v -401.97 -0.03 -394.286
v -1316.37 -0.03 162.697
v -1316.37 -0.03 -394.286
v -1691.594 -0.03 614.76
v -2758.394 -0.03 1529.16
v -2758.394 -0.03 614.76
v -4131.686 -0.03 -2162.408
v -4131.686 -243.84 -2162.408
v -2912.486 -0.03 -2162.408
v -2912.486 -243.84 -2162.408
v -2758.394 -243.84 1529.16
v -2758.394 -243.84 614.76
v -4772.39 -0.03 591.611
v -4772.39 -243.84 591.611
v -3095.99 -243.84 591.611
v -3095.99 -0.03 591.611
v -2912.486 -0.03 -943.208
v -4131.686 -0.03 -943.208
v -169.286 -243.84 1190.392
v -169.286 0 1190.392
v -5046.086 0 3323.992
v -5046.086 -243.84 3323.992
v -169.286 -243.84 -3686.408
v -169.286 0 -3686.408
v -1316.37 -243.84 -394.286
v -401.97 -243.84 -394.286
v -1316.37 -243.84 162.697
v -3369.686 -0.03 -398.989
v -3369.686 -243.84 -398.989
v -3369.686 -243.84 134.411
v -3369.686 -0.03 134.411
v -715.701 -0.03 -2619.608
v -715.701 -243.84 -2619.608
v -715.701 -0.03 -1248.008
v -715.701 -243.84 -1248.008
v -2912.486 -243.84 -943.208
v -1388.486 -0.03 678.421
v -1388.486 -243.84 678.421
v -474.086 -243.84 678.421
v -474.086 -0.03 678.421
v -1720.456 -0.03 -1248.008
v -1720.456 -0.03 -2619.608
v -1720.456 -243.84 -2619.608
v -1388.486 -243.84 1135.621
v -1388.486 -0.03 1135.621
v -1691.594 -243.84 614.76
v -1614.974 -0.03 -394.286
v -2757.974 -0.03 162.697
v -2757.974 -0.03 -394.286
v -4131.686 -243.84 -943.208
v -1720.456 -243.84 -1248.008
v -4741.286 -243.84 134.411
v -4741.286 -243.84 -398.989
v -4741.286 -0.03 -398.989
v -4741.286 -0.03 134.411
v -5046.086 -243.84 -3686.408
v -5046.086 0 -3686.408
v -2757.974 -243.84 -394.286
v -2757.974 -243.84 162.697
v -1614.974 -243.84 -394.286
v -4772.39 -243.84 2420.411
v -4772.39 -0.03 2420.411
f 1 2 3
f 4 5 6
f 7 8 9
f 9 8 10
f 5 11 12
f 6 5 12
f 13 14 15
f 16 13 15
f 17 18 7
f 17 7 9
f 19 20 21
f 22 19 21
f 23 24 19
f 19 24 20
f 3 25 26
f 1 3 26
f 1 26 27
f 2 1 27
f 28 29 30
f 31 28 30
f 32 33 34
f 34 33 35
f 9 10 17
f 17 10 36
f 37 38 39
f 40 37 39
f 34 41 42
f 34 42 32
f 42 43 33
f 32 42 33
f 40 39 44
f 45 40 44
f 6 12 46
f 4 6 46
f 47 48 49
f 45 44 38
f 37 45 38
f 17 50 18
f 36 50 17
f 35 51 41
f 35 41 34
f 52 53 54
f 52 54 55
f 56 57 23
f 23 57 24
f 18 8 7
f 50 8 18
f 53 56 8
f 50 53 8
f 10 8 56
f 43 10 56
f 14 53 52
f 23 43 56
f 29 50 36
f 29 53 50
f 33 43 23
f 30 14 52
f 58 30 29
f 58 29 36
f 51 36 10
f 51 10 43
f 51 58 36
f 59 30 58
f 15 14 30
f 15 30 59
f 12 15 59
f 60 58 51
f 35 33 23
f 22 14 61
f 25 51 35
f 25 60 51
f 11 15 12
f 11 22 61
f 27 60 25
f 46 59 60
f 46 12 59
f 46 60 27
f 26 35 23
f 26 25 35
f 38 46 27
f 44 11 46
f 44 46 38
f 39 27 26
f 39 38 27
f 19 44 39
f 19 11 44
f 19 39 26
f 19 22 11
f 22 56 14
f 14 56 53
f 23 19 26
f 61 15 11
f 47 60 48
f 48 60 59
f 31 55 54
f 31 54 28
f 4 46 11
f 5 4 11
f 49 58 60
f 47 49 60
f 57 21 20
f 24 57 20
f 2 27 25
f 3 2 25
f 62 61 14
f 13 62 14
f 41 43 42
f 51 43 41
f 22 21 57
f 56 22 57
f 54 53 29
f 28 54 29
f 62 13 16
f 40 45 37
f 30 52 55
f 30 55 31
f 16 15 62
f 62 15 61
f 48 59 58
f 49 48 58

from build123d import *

# Parameters (mm, degrees)
F1_DEPTH = 243.84
F2_W     = 1371.6
F2_H     = 533.4
F2_W_2   = 1219.2
F2_H_2   = 1219.2
F2_W_3   = 1004.754603
F2_H_3   = 1371.6
F3_DEPTH = 243.80952


with BuildPart() as f1:
    # F0 (on Front) → F1 (new body)
    with BuildSketch(Plane.XZ):
        Polygon((-169.28589, 1190.391718), (-5046.08589, 3323.991718), (-5046.08589, -3686.408282), (-169.28589, -3686.408282), align=None)
    extrude(amount=F1_DEPTH)

    # F2 (on face) → F3 (cut)
    with BuildSketch(Plane.XZ.offset(243.84)):
        Polygon((-3095.989677, 591.610532), (-4772.389677, 2420.410532), (-4772.389677, 591.610532), align=None)
        Polygon((-1691.594337, 614.760013), (-2758.394337, 1529.160013), (-2758.394337, 614.760013), align=None)
        Polygon((-474.08589, 678.420737), (-1388.48589, 1135.620737), (-1388.48589, 678.420737), align=None)
        with Locations((-4055.48589, -132.289468)):
            Rectangle(F2_W, F2_H)
        Polygon((-1614.973909, -394.286305), (-2757.973909, 162.697271), (-2757.973909, -394.286305), align=None)
        Polygon((-401.969534, -394.286305), (-1316.369534, 162.697271), (-1316.369534, -394.286305), align=None)
        with Locations((-3522.08589, -1552.808282)):
            Rectangle(F2_W_2, F2_H_2)
        with Locations((-1218.078346, -1933.808282)):
            Rectangle(F2_W_3, F2_H_3)
    extrude(amount=-F3_DEPTH, mode=Mode.SUBTRACT)


solid = f1.part
